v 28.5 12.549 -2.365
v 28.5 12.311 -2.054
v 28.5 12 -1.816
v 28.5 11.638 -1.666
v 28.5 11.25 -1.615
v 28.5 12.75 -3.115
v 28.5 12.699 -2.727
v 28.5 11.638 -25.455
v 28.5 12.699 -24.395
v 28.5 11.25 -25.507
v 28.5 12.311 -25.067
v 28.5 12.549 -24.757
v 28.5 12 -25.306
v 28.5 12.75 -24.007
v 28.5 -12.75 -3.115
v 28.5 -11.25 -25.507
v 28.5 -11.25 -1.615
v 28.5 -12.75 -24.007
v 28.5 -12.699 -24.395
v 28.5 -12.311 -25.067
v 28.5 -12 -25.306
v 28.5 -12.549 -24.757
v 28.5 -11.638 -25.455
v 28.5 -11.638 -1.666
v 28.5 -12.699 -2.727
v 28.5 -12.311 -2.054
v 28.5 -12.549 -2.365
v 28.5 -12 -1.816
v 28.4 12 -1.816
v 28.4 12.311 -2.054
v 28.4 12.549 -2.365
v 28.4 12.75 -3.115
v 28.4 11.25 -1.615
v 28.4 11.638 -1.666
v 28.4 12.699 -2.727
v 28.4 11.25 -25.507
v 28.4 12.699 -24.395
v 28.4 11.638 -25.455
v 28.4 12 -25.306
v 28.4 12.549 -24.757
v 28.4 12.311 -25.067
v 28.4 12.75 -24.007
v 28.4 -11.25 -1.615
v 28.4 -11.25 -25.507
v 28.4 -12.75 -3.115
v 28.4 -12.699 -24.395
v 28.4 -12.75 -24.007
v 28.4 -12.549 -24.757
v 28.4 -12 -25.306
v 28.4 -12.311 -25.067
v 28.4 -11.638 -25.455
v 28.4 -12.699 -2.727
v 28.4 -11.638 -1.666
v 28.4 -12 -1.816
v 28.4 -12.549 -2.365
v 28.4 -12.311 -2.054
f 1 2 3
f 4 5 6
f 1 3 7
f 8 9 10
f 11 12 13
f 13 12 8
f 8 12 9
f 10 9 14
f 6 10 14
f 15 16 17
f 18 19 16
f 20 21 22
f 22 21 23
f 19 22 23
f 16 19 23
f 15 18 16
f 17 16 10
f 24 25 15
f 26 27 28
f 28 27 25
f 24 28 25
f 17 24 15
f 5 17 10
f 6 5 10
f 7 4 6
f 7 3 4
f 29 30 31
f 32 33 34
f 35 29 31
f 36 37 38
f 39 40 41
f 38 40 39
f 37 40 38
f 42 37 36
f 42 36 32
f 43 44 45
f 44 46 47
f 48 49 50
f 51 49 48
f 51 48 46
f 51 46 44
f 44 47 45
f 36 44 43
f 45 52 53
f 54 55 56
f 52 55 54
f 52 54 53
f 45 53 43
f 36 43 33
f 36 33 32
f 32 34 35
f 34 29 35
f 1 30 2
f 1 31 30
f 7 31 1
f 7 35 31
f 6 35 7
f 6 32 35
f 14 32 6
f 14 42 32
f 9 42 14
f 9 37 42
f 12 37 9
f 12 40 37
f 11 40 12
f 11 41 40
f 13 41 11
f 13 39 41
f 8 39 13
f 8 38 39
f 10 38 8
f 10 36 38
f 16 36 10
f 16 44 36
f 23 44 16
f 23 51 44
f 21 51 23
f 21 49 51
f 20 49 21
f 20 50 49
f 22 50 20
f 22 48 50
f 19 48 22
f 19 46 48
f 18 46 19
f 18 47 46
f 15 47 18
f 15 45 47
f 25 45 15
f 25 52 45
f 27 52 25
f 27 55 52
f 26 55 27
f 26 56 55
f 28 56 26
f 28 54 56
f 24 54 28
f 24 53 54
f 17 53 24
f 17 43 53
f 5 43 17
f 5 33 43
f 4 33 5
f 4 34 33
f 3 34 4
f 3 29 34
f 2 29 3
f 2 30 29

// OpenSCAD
inf = 200;

cube_l = 57;
cube_corner_r = 1;
sticker_margin = 1.5;
sticker_r = 1.5;

h = cube_l;
r = cube_corner_r;

function f0(x) = h*x^4 + 2*h*x^3 + (20*r-10*h)*x^2 + (8*r-2*h)*x + (h-4*r);
function df0(x) = 4*h*x^3 + 6*h*x^2 + (40*r-20*h)*x + (8*r-2*h);

x0 = 5 ^ 0.5 - 2;
x1 = x0 - f0(x0) / df0(x0);
x2 = x1 - f0(x1) / df0(x1);
x3 = x2 - f0(x2) / df0(x2);
x = x3;

theta = atan(x);

a = h / 2 + r * tan(theta * 2);
b = h / 2 / tan(theta * 2) + r;
hmid_h = (h / 2 - r) * sin(theta * 2) * 2;
echo(a / h);
echo(b / h);

module body(d = 0) {
    h2 = h + d * 2;
    h1 = h / 2 + d * 2;
    cube([h2, h2, h1], center = true);
}

module hmid_layer(d = 0) {
    h_t = hmid_h + d * 2;
    rotate([0, 0, theta * 2])
        cube([inf, h_t, inf], center = true);
}

module hright_layer(d = 0) {
    h_t = hmid_h / 2 - d;
    rotate([0, 0, theta * 2])
        translate([-inf / 2, h_t, -inf / 2])
            cube([inf, inf, inf]);
}

module center_block() {
    minkowski() {
        intersection() {
            body(-r);
            hmid_layer(-r);
            rotate([0, 0, -90]) hmid_layer(-r);
        }
        sphere(r, $fn = 24);
    }
}

module edge_block() {
    minkowski() {
        intersection() {
            body(-r);
            hright_layer(-r);
            rotate([0, 0, -90]) hmid_layer(-r);
        }
        sphere(r, $fn = 24);
    }
}

module corner_block() {
    minkowski() {
        intersection() {
            body(-r);
            hright_layer(-r);
            rotate([0, 0, -90]) hright_layer(-r);
        }
        sphere(r, $fn = 24);
    }
}

module center_sticker() {
    linear_extrude(0.1) {
        minkowski() {
            projection(true) {
                intersection() {
                    body(-sticker_margin - sticker_r);
                    hmid_layer(-sticker_margin - sticker_r);
                    rotate([0, 0, -90]) hmid_layer(-sticker_margin - sticker_r);
                }
            }
            circle(sticker_r, $fn = 24);
        }
    }
}

module edge_sticker() {
    linear_extrude(0.1) {
        minkowski() {
            projection(true) {
                intersection() {
                    body(-sticker_margin - sticker_r);
                    hright_layer(-sticker_margin - sticker_r);
                    rotate([0, 0, -90]) hmid_layer(-sticker_margin - sticker_r);
                }
            }
            circle(sticker_r, $fn = 24);
        }
    }
}

module corner_sticker() {
    linear_extrude(0.1) {
        minkowski() {
            projection(true) {
                intersection() {
                    body(-sticker_margin - sticker_r);
                    hright_layer(-sticker_margin - sticker_r);
                    rotate([0, 0, -90]) hright_layer(-sticker_margin - sticker_r);
                }
            }
            circle(sticker_r, $fn = 24);
        }
    }
}

module side_sticker() {
    side_lmargin = r / tan(theta) - (h / 2 - (h - r) * tan(theta * 2)) / tan(theta * 2);
    side_rmargin = r / tan(45 - theta) - r * tan(2 * theta);
    w = h / 2 - side_lmargin - side_rmargin + r * 2 - (sticker_margin + sticker_r) * 2;
    t = side_lmargin - r + sticker_margin + sticker_r;
    translate([0, h / 2, 0]) 
    rotate([90, 0, 0]) linear_extrude(0.1) minkowski() {
        translate([-h / 2 + t, -h / 4 + sticker_margin + sticker_r])
            square([w, h / 2 - (sticker_margin + sticker_r) * 2]);
        circle(sticker_r, $fn = 24);
    }
}

rotate([-90, -90, 0]) {
    //color("Gray") center_block();
    //color("Gray") edge_block();
    //color("Gray") corner_block();
    //center_sticker();
    //edge_sticker();
    //corner_sticker();
    side_sticker();
}
